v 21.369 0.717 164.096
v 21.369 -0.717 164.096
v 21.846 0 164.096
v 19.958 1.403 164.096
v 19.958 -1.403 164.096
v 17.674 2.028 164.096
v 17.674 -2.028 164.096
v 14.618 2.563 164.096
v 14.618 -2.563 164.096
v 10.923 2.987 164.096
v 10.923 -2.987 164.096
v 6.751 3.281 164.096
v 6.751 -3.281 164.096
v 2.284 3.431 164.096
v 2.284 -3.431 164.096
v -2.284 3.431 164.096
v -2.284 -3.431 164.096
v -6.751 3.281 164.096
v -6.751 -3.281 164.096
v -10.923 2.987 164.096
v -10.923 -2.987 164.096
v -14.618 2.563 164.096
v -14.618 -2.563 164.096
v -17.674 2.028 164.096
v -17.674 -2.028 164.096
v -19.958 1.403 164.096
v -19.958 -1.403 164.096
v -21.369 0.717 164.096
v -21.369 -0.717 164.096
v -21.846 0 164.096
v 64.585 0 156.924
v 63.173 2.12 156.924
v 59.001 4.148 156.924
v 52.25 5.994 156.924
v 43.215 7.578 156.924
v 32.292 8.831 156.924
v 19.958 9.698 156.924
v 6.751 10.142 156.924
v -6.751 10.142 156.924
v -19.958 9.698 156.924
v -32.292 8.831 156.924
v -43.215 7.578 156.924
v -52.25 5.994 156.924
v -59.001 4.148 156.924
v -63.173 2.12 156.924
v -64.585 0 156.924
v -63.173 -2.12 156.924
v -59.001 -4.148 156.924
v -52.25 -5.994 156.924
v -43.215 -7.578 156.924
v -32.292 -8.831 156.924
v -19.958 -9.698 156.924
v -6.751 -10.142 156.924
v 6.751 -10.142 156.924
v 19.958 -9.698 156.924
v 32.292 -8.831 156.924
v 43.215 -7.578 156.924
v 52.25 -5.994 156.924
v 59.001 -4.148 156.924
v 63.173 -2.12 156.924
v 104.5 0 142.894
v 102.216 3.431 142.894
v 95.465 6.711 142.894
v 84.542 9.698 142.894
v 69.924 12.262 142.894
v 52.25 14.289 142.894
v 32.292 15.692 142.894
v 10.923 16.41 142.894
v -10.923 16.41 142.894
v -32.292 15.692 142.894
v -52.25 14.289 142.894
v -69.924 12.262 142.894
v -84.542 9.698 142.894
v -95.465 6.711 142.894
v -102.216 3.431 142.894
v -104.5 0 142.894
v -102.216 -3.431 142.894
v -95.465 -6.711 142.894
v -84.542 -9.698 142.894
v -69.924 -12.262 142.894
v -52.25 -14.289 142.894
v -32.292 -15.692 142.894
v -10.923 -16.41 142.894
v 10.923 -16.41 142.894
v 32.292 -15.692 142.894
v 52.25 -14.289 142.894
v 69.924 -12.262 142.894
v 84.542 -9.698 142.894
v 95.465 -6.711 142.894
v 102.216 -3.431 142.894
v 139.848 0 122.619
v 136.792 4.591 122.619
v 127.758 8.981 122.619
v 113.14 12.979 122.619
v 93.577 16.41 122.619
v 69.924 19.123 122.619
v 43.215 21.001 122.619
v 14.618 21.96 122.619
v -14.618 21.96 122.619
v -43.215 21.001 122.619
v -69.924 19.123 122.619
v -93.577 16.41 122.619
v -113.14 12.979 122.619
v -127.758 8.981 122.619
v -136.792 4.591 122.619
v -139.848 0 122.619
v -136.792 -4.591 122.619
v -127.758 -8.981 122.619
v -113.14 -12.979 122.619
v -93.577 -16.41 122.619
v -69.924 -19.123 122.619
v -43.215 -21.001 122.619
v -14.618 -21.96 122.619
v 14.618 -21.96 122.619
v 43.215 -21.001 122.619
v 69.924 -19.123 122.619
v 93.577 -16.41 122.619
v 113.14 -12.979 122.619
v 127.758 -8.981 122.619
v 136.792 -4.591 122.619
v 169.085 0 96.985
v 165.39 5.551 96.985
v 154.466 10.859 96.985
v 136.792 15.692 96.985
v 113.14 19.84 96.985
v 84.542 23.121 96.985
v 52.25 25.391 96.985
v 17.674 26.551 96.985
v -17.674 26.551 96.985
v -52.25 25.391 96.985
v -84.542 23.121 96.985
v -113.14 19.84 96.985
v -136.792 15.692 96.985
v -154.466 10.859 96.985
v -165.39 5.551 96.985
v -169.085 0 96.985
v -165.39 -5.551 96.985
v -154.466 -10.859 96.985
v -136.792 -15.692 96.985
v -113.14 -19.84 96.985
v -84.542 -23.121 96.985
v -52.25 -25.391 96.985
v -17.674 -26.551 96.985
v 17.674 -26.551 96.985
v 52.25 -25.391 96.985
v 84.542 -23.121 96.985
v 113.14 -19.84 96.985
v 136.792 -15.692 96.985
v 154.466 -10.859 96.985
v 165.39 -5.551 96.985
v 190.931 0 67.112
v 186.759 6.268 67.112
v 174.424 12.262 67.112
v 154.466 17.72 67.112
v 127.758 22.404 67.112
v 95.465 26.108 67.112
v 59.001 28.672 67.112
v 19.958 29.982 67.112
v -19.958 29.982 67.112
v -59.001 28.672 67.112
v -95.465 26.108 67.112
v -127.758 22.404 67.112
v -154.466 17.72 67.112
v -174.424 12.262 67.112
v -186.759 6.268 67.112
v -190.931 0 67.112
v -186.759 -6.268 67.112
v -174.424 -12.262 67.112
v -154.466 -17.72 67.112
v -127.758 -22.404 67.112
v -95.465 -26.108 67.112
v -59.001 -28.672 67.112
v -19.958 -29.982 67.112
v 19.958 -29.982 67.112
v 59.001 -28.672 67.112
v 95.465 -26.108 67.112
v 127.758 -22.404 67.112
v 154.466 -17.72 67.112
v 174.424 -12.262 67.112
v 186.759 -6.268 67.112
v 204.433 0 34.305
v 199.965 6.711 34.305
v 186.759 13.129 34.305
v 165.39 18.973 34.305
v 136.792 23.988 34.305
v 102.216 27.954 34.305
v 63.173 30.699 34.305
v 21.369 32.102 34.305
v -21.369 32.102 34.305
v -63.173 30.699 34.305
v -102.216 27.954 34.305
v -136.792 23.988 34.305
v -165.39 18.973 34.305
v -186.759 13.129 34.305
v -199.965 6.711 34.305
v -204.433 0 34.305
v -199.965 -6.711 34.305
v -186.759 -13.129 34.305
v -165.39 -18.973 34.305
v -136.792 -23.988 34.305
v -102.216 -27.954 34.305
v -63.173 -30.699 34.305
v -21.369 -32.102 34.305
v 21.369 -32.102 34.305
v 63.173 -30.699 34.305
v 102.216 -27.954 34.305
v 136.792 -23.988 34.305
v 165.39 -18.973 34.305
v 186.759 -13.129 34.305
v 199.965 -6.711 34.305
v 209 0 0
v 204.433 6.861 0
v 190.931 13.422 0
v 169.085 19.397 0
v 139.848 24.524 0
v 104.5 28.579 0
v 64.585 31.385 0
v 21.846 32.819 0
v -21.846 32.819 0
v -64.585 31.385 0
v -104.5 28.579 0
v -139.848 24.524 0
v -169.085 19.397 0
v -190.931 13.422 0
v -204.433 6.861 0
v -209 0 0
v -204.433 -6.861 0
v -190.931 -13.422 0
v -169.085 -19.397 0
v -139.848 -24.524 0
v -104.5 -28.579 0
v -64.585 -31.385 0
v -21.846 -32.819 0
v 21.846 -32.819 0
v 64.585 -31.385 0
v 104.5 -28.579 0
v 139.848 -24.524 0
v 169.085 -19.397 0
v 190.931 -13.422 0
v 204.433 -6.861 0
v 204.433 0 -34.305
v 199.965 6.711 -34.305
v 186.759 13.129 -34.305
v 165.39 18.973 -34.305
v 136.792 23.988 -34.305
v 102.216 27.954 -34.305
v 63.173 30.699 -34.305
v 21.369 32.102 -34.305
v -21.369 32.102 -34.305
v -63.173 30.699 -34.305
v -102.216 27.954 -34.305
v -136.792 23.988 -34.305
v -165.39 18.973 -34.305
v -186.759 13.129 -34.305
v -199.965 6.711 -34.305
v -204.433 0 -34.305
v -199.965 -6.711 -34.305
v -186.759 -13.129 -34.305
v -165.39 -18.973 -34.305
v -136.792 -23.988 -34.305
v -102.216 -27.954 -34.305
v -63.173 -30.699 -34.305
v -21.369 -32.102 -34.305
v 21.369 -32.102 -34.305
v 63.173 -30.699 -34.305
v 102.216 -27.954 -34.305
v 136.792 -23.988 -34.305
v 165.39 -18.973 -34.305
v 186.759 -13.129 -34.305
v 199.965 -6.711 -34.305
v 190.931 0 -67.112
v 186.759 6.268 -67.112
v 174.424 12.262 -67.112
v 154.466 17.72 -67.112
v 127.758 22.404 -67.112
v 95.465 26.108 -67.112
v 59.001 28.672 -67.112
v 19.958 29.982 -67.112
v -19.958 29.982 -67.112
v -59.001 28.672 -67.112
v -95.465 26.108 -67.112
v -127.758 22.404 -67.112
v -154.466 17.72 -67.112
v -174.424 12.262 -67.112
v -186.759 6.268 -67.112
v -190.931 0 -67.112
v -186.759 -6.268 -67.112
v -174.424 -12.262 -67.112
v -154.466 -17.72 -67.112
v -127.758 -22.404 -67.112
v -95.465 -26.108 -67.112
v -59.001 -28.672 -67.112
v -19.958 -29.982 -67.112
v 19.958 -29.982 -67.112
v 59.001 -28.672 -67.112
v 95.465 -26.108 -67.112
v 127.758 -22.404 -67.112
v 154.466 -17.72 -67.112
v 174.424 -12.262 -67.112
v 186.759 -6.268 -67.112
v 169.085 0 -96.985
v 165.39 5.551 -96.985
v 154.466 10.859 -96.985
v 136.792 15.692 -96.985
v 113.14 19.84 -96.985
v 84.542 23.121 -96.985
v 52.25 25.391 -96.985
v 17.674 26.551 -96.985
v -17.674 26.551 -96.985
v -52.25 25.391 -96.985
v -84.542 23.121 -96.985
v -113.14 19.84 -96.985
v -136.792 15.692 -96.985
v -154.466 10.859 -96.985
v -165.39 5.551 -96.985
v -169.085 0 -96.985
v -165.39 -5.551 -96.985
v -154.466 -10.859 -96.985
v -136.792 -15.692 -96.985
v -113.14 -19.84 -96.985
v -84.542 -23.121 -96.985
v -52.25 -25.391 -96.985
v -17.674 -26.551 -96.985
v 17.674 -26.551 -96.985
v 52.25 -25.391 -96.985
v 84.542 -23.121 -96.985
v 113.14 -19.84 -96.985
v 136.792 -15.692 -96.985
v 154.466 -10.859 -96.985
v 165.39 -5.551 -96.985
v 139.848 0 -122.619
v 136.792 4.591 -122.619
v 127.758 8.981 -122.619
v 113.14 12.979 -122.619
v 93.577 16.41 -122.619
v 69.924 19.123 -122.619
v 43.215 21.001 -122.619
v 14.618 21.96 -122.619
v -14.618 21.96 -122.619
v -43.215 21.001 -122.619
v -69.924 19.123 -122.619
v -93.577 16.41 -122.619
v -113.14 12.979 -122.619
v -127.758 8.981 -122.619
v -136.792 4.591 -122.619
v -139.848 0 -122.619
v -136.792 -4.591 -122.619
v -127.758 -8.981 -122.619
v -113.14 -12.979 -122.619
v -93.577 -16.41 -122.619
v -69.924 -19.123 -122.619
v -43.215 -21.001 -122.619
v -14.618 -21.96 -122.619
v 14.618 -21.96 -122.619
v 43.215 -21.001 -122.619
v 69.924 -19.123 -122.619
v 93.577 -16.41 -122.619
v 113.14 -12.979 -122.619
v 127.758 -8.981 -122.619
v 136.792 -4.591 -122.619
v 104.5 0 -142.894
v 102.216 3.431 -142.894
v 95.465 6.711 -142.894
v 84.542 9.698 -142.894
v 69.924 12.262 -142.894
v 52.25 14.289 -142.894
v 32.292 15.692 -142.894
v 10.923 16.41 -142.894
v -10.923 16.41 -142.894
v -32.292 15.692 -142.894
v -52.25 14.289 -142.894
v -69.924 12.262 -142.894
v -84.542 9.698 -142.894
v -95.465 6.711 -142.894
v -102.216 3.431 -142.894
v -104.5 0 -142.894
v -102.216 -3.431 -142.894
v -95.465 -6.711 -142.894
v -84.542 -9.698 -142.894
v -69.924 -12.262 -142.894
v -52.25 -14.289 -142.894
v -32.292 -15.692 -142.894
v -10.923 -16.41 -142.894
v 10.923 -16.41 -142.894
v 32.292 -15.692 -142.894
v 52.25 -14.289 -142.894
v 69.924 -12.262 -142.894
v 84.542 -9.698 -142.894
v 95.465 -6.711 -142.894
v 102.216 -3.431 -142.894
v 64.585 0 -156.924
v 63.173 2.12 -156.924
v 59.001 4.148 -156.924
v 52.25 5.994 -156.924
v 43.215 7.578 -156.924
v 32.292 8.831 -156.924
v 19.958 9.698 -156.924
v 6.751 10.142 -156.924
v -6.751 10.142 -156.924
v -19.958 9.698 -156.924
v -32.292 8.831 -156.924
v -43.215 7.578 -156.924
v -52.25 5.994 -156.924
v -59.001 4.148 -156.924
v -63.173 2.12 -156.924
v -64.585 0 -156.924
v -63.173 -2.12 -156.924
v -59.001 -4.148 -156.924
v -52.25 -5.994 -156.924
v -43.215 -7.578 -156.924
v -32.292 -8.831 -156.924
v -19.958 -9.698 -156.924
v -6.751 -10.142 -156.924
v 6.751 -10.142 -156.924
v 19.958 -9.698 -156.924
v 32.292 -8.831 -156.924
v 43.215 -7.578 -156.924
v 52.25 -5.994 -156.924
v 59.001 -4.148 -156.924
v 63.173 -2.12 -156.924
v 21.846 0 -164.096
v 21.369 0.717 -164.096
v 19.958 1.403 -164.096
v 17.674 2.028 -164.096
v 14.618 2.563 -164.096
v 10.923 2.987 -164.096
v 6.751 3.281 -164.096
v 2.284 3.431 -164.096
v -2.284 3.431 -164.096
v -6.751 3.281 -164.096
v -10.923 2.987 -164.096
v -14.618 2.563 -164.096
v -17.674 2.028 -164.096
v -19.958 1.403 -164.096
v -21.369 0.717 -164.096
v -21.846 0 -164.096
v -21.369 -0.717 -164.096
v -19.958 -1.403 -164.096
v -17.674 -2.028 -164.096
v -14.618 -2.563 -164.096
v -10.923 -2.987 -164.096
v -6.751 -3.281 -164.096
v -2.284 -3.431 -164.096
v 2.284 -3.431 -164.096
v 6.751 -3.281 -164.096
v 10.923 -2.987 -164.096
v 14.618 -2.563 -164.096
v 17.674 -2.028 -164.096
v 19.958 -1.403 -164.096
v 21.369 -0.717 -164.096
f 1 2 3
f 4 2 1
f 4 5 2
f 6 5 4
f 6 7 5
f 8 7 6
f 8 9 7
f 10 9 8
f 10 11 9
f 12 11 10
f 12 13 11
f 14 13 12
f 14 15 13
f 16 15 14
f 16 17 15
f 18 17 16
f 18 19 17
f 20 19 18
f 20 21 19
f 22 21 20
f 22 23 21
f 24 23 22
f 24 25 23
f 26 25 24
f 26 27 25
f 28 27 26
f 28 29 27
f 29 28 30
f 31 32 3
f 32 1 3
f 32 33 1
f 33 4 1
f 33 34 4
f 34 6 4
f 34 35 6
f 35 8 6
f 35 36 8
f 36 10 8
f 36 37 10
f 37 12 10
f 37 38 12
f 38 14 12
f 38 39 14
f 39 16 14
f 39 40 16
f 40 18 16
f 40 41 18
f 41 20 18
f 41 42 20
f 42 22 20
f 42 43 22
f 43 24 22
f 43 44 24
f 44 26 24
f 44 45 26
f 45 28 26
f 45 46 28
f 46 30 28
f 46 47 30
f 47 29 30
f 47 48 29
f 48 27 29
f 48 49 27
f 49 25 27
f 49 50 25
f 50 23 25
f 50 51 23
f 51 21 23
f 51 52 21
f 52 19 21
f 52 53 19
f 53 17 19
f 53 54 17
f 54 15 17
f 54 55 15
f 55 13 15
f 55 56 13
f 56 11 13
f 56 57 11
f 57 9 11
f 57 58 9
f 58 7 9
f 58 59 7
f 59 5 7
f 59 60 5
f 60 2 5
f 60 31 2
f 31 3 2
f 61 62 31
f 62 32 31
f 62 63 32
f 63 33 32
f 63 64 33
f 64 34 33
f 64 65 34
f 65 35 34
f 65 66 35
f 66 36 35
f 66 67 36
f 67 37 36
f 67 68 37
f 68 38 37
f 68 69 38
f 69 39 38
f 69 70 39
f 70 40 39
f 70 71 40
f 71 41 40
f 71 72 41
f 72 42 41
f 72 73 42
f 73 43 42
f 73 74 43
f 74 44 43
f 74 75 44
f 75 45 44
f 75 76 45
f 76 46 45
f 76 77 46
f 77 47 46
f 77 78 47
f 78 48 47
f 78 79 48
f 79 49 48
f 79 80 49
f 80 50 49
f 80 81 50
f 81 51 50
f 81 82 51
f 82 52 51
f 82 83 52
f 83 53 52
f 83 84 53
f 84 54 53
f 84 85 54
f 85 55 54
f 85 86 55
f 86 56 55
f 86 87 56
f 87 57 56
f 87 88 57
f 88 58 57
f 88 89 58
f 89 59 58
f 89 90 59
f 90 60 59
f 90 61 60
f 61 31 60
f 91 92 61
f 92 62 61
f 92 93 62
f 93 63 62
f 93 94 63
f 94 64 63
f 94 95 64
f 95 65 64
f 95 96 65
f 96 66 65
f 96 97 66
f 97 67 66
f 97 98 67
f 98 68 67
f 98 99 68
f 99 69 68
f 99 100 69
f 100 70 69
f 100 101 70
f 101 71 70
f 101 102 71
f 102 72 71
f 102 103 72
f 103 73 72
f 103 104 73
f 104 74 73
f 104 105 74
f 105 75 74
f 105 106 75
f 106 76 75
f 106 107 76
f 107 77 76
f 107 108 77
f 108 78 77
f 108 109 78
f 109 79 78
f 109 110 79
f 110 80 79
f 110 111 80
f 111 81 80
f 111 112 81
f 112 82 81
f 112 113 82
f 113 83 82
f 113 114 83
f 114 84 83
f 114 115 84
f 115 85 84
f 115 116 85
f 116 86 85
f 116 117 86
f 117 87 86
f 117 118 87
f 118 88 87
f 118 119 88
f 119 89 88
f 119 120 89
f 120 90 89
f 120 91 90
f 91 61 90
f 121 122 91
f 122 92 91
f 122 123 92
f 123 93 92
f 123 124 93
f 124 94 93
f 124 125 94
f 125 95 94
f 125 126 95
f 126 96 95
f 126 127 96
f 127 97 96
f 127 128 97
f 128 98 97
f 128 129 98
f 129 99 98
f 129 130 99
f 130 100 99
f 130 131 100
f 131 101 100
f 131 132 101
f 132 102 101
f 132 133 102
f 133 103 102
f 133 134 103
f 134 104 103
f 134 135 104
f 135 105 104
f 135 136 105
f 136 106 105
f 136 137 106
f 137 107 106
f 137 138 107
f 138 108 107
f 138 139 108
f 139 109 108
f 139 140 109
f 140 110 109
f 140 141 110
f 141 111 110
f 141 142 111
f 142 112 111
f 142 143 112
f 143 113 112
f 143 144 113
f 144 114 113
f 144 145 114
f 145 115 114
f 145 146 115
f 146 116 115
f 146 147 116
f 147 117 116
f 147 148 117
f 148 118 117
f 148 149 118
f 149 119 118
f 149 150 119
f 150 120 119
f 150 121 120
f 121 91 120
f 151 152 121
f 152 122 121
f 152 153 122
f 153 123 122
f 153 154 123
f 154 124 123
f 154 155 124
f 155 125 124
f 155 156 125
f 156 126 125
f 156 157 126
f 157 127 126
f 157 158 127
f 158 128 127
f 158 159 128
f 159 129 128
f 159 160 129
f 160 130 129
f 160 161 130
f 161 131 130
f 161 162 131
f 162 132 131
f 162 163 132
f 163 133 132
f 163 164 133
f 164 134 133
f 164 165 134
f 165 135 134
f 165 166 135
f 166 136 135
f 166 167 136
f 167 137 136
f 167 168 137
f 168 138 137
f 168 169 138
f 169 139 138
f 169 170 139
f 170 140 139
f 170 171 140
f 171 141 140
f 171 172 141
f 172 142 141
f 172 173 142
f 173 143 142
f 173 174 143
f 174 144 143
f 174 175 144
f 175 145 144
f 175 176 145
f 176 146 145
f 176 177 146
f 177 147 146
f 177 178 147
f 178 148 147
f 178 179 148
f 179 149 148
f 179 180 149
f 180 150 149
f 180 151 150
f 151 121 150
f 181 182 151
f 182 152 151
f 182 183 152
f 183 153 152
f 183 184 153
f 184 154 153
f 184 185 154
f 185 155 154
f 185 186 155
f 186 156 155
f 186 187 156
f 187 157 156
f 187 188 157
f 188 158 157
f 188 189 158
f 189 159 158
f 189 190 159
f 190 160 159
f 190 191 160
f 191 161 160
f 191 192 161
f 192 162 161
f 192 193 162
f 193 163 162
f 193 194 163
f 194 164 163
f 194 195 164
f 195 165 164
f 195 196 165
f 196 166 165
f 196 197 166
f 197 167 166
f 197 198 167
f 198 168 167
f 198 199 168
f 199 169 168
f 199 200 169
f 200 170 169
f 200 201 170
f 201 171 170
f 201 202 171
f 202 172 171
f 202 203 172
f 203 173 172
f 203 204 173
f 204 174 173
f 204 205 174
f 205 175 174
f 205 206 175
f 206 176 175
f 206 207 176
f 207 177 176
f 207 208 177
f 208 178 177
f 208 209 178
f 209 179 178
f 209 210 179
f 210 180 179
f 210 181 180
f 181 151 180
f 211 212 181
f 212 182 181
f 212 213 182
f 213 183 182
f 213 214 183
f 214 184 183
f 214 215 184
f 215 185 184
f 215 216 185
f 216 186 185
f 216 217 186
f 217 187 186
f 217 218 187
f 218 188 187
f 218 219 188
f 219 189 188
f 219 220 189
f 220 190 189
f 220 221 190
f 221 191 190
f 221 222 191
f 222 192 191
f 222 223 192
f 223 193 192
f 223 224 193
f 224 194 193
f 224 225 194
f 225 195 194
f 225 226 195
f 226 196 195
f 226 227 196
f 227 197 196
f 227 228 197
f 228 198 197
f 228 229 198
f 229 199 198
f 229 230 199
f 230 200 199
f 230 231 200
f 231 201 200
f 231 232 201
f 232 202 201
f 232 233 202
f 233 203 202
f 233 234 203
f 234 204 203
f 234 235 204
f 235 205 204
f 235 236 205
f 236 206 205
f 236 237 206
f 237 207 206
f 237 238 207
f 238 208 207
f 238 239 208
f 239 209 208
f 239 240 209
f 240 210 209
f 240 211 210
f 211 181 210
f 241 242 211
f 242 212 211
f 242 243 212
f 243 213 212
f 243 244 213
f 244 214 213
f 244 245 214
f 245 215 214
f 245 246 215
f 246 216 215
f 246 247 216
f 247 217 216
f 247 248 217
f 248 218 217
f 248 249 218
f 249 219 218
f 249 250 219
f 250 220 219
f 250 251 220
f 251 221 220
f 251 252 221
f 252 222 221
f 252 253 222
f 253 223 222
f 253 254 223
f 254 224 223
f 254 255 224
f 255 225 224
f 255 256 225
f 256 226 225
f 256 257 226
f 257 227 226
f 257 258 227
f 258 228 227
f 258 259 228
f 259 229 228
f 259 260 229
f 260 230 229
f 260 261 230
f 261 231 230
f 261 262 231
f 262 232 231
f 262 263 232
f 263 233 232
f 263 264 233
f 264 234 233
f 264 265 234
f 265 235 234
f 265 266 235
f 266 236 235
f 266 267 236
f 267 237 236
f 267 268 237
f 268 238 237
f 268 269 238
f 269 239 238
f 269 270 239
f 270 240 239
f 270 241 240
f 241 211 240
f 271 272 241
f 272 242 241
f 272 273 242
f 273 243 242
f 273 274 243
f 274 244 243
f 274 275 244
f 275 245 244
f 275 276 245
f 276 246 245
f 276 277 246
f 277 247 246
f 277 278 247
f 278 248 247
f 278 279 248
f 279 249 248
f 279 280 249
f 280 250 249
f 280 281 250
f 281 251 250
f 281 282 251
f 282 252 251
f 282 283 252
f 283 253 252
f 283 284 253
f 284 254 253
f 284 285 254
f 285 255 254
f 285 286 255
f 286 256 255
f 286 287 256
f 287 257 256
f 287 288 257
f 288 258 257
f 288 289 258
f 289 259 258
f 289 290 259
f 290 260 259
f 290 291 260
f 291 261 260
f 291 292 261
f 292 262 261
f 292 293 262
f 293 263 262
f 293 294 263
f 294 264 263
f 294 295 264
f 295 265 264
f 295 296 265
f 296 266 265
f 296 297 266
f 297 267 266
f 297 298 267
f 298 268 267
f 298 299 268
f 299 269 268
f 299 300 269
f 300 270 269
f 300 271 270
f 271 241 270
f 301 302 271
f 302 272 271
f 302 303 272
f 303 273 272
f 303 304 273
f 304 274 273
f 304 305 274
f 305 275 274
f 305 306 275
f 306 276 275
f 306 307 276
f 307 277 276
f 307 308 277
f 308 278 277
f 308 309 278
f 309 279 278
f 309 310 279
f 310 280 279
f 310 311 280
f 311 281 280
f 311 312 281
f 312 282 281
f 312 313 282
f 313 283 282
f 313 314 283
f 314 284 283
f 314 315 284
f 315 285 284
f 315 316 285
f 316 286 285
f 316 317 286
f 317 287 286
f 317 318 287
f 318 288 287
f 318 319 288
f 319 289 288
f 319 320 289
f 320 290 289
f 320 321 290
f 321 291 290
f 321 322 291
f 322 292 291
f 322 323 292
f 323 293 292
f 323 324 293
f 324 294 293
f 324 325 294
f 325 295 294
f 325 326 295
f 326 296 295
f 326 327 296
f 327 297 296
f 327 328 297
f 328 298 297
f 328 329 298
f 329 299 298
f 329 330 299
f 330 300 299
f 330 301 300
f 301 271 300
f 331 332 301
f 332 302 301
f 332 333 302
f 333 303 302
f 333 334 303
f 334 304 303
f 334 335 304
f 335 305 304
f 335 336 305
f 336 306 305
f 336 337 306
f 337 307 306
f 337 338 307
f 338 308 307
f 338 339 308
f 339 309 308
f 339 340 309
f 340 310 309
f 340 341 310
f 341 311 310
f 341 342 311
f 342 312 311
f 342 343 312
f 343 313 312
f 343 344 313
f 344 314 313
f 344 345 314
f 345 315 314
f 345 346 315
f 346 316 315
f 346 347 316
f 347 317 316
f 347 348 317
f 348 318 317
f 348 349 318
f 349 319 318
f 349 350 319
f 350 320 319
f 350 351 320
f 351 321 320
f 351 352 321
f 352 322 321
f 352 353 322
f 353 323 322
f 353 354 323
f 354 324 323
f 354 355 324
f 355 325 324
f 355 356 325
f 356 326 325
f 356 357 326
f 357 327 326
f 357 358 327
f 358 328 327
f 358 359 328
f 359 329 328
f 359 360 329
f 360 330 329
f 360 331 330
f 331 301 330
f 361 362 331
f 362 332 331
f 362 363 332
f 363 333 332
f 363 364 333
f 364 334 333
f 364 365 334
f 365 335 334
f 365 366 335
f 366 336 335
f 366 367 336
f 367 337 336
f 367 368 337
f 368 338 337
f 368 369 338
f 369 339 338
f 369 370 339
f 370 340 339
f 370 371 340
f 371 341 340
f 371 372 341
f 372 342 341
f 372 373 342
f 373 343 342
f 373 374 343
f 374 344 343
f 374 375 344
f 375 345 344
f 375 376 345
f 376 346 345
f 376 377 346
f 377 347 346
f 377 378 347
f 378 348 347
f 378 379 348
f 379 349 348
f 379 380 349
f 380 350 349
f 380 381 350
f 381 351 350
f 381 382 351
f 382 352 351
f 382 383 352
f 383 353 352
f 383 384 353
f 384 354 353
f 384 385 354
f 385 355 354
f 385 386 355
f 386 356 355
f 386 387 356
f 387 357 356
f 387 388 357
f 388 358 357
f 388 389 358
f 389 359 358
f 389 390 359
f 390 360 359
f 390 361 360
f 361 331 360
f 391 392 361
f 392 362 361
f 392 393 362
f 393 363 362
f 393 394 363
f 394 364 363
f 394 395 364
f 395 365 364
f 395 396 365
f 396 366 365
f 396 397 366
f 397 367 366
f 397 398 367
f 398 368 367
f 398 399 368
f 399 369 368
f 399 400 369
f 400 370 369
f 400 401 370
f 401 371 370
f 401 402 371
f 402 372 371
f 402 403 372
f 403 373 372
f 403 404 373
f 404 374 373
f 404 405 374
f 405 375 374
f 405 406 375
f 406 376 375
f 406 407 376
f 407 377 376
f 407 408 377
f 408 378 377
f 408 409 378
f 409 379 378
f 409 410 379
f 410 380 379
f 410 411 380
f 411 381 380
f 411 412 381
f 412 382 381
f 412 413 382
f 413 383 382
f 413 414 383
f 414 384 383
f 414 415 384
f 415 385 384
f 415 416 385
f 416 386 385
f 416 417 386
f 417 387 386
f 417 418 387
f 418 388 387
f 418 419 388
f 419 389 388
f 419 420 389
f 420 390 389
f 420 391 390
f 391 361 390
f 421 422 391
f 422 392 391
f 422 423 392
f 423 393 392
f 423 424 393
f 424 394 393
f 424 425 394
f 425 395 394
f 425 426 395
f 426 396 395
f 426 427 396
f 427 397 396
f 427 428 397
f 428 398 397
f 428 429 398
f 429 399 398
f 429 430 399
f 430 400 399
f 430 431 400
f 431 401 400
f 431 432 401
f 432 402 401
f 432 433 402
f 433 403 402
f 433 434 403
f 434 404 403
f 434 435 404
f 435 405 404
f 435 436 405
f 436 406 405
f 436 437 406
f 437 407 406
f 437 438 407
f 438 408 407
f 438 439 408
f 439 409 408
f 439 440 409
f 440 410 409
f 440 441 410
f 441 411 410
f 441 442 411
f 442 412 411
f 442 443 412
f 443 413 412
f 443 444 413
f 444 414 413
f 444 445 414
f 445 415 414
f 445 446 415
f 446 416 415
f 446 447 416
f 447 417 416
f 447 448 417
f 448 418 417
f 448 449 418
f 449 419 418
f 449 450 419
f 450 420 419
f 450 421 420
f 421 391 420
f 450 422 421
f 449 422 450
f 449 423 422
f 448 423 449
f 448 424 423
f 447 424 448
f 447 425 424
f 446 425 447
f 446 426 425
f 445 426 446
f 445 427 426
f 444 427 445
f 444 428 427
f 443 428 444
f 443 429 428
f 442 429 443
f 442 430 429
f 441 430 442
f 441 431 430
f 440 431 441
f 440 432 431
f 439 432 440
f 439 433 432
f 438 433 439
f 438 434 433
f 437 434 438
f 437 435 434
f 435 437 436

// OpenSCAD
// Generated by SolidPython 1.0.1 on 2020-07-29 00:46:53


scale(v = [19, 3, 15]) {
	sphere(r = 11);
}
/***********************************************
*********      SolidPython code:      **********
************************************************
 
# import packages: SolidPython
from solid import *
from solid.utils import *
from itertools import chain, combinations, permutations


class Resize:

    def __init__(self, scad_file):
        self.scad_file = scad_file
        #self.scad_file = import_scad(scad_file)
        # cone/cylinder param:
        self.r1 = 0
        self.r2 = 0
        self.h = 0
        # rectangular prism param:
        self.w = 0
        self.l = 0
        # ellipse param:
        self.r = 0

    # import OpenScad code (file name corresponds to shape)


    # classify shape + parameters
    def assign(self, param1, param2, param3):
        if self.scad_file == 'cone.scad':
            self.r1 = param1
            self.r2 = param2
            self.h = param3
        elif self.scad_file == 'cylinder.scad':
            self.r1 = param1
            self.r2 = param2
            self.h = param3
        elif self.scad_file == 'rectangularPrism.scad':
            self.h = param1
            self.l = param2
            self.w = param3
        else:
            self.r = param1
            self.h = param2

    # resize parameters
    def iterate(self):
        x = range(3, 20, 2)
        i = 1
        if self.scad_file == 'cone.scad':
            tempList = list(permutations(x, 2))
            for temp in tempList:
                param1 = temp[0]
                param2 = temp[1]
                filepath = 'produced_scad_files/' + 'cone' + str(param1) + '_' + str(param2) + '_' + '.scad'
                scad_render_to_file(cylinder(h=param1, r1=param2, r2=0), filepath)

        elif self.scad_file == 'cylinder.scad':
            tempList = list(permutations(x, 3))
            for temp in tempList:
                param1 = temp[0]
                param2 = temp[1]
                filepath = 'produced_scad_files/' + 'cylinder' + str(param1) + '_' + str(param2) + '_' + '.scad'
                scad_render_to_file(cylinder(h=param1, r1=param2, r2=param2), filepath)

        elif self.scad_file == 'rectangularPrism.scad':
            tempList = list(permutations(x, 3))
            for temp in tempList:
                param1 = temp[0]
                param2 = temp[1]
                param3 = temp[2]
                filepath = 'produced_scad_files/' + 'rectangularPrism' + str(param1) + '_' + str(param2) + '_' + str(
                    param3) + '.scad'
                scad_render_to_file(cube(size=(param1, param2, param3)), filepath)

        elif self.scad_file == 'ellipse.scad':
            tempList = list(permutations(x, 4))
            for temp in tempList:
                param1 = temp[0]
                param2 = temp[1]
                param3 = temp[2]
                param4 = temp[3]
                filepath = 'produced_scad_files/' + 'ellipse' + str(param1) + '_' + str(param2) + '_' + str(param3) + '_' + str(param4) + '.scad'
                scad_render_to_file(scale([param1, param2, param3])(sphere(r=param4)), filepath)

    def render_to_scadfile(self):
        scad_render_to_file(scad, 'example.scad') 
 
************************************************/
